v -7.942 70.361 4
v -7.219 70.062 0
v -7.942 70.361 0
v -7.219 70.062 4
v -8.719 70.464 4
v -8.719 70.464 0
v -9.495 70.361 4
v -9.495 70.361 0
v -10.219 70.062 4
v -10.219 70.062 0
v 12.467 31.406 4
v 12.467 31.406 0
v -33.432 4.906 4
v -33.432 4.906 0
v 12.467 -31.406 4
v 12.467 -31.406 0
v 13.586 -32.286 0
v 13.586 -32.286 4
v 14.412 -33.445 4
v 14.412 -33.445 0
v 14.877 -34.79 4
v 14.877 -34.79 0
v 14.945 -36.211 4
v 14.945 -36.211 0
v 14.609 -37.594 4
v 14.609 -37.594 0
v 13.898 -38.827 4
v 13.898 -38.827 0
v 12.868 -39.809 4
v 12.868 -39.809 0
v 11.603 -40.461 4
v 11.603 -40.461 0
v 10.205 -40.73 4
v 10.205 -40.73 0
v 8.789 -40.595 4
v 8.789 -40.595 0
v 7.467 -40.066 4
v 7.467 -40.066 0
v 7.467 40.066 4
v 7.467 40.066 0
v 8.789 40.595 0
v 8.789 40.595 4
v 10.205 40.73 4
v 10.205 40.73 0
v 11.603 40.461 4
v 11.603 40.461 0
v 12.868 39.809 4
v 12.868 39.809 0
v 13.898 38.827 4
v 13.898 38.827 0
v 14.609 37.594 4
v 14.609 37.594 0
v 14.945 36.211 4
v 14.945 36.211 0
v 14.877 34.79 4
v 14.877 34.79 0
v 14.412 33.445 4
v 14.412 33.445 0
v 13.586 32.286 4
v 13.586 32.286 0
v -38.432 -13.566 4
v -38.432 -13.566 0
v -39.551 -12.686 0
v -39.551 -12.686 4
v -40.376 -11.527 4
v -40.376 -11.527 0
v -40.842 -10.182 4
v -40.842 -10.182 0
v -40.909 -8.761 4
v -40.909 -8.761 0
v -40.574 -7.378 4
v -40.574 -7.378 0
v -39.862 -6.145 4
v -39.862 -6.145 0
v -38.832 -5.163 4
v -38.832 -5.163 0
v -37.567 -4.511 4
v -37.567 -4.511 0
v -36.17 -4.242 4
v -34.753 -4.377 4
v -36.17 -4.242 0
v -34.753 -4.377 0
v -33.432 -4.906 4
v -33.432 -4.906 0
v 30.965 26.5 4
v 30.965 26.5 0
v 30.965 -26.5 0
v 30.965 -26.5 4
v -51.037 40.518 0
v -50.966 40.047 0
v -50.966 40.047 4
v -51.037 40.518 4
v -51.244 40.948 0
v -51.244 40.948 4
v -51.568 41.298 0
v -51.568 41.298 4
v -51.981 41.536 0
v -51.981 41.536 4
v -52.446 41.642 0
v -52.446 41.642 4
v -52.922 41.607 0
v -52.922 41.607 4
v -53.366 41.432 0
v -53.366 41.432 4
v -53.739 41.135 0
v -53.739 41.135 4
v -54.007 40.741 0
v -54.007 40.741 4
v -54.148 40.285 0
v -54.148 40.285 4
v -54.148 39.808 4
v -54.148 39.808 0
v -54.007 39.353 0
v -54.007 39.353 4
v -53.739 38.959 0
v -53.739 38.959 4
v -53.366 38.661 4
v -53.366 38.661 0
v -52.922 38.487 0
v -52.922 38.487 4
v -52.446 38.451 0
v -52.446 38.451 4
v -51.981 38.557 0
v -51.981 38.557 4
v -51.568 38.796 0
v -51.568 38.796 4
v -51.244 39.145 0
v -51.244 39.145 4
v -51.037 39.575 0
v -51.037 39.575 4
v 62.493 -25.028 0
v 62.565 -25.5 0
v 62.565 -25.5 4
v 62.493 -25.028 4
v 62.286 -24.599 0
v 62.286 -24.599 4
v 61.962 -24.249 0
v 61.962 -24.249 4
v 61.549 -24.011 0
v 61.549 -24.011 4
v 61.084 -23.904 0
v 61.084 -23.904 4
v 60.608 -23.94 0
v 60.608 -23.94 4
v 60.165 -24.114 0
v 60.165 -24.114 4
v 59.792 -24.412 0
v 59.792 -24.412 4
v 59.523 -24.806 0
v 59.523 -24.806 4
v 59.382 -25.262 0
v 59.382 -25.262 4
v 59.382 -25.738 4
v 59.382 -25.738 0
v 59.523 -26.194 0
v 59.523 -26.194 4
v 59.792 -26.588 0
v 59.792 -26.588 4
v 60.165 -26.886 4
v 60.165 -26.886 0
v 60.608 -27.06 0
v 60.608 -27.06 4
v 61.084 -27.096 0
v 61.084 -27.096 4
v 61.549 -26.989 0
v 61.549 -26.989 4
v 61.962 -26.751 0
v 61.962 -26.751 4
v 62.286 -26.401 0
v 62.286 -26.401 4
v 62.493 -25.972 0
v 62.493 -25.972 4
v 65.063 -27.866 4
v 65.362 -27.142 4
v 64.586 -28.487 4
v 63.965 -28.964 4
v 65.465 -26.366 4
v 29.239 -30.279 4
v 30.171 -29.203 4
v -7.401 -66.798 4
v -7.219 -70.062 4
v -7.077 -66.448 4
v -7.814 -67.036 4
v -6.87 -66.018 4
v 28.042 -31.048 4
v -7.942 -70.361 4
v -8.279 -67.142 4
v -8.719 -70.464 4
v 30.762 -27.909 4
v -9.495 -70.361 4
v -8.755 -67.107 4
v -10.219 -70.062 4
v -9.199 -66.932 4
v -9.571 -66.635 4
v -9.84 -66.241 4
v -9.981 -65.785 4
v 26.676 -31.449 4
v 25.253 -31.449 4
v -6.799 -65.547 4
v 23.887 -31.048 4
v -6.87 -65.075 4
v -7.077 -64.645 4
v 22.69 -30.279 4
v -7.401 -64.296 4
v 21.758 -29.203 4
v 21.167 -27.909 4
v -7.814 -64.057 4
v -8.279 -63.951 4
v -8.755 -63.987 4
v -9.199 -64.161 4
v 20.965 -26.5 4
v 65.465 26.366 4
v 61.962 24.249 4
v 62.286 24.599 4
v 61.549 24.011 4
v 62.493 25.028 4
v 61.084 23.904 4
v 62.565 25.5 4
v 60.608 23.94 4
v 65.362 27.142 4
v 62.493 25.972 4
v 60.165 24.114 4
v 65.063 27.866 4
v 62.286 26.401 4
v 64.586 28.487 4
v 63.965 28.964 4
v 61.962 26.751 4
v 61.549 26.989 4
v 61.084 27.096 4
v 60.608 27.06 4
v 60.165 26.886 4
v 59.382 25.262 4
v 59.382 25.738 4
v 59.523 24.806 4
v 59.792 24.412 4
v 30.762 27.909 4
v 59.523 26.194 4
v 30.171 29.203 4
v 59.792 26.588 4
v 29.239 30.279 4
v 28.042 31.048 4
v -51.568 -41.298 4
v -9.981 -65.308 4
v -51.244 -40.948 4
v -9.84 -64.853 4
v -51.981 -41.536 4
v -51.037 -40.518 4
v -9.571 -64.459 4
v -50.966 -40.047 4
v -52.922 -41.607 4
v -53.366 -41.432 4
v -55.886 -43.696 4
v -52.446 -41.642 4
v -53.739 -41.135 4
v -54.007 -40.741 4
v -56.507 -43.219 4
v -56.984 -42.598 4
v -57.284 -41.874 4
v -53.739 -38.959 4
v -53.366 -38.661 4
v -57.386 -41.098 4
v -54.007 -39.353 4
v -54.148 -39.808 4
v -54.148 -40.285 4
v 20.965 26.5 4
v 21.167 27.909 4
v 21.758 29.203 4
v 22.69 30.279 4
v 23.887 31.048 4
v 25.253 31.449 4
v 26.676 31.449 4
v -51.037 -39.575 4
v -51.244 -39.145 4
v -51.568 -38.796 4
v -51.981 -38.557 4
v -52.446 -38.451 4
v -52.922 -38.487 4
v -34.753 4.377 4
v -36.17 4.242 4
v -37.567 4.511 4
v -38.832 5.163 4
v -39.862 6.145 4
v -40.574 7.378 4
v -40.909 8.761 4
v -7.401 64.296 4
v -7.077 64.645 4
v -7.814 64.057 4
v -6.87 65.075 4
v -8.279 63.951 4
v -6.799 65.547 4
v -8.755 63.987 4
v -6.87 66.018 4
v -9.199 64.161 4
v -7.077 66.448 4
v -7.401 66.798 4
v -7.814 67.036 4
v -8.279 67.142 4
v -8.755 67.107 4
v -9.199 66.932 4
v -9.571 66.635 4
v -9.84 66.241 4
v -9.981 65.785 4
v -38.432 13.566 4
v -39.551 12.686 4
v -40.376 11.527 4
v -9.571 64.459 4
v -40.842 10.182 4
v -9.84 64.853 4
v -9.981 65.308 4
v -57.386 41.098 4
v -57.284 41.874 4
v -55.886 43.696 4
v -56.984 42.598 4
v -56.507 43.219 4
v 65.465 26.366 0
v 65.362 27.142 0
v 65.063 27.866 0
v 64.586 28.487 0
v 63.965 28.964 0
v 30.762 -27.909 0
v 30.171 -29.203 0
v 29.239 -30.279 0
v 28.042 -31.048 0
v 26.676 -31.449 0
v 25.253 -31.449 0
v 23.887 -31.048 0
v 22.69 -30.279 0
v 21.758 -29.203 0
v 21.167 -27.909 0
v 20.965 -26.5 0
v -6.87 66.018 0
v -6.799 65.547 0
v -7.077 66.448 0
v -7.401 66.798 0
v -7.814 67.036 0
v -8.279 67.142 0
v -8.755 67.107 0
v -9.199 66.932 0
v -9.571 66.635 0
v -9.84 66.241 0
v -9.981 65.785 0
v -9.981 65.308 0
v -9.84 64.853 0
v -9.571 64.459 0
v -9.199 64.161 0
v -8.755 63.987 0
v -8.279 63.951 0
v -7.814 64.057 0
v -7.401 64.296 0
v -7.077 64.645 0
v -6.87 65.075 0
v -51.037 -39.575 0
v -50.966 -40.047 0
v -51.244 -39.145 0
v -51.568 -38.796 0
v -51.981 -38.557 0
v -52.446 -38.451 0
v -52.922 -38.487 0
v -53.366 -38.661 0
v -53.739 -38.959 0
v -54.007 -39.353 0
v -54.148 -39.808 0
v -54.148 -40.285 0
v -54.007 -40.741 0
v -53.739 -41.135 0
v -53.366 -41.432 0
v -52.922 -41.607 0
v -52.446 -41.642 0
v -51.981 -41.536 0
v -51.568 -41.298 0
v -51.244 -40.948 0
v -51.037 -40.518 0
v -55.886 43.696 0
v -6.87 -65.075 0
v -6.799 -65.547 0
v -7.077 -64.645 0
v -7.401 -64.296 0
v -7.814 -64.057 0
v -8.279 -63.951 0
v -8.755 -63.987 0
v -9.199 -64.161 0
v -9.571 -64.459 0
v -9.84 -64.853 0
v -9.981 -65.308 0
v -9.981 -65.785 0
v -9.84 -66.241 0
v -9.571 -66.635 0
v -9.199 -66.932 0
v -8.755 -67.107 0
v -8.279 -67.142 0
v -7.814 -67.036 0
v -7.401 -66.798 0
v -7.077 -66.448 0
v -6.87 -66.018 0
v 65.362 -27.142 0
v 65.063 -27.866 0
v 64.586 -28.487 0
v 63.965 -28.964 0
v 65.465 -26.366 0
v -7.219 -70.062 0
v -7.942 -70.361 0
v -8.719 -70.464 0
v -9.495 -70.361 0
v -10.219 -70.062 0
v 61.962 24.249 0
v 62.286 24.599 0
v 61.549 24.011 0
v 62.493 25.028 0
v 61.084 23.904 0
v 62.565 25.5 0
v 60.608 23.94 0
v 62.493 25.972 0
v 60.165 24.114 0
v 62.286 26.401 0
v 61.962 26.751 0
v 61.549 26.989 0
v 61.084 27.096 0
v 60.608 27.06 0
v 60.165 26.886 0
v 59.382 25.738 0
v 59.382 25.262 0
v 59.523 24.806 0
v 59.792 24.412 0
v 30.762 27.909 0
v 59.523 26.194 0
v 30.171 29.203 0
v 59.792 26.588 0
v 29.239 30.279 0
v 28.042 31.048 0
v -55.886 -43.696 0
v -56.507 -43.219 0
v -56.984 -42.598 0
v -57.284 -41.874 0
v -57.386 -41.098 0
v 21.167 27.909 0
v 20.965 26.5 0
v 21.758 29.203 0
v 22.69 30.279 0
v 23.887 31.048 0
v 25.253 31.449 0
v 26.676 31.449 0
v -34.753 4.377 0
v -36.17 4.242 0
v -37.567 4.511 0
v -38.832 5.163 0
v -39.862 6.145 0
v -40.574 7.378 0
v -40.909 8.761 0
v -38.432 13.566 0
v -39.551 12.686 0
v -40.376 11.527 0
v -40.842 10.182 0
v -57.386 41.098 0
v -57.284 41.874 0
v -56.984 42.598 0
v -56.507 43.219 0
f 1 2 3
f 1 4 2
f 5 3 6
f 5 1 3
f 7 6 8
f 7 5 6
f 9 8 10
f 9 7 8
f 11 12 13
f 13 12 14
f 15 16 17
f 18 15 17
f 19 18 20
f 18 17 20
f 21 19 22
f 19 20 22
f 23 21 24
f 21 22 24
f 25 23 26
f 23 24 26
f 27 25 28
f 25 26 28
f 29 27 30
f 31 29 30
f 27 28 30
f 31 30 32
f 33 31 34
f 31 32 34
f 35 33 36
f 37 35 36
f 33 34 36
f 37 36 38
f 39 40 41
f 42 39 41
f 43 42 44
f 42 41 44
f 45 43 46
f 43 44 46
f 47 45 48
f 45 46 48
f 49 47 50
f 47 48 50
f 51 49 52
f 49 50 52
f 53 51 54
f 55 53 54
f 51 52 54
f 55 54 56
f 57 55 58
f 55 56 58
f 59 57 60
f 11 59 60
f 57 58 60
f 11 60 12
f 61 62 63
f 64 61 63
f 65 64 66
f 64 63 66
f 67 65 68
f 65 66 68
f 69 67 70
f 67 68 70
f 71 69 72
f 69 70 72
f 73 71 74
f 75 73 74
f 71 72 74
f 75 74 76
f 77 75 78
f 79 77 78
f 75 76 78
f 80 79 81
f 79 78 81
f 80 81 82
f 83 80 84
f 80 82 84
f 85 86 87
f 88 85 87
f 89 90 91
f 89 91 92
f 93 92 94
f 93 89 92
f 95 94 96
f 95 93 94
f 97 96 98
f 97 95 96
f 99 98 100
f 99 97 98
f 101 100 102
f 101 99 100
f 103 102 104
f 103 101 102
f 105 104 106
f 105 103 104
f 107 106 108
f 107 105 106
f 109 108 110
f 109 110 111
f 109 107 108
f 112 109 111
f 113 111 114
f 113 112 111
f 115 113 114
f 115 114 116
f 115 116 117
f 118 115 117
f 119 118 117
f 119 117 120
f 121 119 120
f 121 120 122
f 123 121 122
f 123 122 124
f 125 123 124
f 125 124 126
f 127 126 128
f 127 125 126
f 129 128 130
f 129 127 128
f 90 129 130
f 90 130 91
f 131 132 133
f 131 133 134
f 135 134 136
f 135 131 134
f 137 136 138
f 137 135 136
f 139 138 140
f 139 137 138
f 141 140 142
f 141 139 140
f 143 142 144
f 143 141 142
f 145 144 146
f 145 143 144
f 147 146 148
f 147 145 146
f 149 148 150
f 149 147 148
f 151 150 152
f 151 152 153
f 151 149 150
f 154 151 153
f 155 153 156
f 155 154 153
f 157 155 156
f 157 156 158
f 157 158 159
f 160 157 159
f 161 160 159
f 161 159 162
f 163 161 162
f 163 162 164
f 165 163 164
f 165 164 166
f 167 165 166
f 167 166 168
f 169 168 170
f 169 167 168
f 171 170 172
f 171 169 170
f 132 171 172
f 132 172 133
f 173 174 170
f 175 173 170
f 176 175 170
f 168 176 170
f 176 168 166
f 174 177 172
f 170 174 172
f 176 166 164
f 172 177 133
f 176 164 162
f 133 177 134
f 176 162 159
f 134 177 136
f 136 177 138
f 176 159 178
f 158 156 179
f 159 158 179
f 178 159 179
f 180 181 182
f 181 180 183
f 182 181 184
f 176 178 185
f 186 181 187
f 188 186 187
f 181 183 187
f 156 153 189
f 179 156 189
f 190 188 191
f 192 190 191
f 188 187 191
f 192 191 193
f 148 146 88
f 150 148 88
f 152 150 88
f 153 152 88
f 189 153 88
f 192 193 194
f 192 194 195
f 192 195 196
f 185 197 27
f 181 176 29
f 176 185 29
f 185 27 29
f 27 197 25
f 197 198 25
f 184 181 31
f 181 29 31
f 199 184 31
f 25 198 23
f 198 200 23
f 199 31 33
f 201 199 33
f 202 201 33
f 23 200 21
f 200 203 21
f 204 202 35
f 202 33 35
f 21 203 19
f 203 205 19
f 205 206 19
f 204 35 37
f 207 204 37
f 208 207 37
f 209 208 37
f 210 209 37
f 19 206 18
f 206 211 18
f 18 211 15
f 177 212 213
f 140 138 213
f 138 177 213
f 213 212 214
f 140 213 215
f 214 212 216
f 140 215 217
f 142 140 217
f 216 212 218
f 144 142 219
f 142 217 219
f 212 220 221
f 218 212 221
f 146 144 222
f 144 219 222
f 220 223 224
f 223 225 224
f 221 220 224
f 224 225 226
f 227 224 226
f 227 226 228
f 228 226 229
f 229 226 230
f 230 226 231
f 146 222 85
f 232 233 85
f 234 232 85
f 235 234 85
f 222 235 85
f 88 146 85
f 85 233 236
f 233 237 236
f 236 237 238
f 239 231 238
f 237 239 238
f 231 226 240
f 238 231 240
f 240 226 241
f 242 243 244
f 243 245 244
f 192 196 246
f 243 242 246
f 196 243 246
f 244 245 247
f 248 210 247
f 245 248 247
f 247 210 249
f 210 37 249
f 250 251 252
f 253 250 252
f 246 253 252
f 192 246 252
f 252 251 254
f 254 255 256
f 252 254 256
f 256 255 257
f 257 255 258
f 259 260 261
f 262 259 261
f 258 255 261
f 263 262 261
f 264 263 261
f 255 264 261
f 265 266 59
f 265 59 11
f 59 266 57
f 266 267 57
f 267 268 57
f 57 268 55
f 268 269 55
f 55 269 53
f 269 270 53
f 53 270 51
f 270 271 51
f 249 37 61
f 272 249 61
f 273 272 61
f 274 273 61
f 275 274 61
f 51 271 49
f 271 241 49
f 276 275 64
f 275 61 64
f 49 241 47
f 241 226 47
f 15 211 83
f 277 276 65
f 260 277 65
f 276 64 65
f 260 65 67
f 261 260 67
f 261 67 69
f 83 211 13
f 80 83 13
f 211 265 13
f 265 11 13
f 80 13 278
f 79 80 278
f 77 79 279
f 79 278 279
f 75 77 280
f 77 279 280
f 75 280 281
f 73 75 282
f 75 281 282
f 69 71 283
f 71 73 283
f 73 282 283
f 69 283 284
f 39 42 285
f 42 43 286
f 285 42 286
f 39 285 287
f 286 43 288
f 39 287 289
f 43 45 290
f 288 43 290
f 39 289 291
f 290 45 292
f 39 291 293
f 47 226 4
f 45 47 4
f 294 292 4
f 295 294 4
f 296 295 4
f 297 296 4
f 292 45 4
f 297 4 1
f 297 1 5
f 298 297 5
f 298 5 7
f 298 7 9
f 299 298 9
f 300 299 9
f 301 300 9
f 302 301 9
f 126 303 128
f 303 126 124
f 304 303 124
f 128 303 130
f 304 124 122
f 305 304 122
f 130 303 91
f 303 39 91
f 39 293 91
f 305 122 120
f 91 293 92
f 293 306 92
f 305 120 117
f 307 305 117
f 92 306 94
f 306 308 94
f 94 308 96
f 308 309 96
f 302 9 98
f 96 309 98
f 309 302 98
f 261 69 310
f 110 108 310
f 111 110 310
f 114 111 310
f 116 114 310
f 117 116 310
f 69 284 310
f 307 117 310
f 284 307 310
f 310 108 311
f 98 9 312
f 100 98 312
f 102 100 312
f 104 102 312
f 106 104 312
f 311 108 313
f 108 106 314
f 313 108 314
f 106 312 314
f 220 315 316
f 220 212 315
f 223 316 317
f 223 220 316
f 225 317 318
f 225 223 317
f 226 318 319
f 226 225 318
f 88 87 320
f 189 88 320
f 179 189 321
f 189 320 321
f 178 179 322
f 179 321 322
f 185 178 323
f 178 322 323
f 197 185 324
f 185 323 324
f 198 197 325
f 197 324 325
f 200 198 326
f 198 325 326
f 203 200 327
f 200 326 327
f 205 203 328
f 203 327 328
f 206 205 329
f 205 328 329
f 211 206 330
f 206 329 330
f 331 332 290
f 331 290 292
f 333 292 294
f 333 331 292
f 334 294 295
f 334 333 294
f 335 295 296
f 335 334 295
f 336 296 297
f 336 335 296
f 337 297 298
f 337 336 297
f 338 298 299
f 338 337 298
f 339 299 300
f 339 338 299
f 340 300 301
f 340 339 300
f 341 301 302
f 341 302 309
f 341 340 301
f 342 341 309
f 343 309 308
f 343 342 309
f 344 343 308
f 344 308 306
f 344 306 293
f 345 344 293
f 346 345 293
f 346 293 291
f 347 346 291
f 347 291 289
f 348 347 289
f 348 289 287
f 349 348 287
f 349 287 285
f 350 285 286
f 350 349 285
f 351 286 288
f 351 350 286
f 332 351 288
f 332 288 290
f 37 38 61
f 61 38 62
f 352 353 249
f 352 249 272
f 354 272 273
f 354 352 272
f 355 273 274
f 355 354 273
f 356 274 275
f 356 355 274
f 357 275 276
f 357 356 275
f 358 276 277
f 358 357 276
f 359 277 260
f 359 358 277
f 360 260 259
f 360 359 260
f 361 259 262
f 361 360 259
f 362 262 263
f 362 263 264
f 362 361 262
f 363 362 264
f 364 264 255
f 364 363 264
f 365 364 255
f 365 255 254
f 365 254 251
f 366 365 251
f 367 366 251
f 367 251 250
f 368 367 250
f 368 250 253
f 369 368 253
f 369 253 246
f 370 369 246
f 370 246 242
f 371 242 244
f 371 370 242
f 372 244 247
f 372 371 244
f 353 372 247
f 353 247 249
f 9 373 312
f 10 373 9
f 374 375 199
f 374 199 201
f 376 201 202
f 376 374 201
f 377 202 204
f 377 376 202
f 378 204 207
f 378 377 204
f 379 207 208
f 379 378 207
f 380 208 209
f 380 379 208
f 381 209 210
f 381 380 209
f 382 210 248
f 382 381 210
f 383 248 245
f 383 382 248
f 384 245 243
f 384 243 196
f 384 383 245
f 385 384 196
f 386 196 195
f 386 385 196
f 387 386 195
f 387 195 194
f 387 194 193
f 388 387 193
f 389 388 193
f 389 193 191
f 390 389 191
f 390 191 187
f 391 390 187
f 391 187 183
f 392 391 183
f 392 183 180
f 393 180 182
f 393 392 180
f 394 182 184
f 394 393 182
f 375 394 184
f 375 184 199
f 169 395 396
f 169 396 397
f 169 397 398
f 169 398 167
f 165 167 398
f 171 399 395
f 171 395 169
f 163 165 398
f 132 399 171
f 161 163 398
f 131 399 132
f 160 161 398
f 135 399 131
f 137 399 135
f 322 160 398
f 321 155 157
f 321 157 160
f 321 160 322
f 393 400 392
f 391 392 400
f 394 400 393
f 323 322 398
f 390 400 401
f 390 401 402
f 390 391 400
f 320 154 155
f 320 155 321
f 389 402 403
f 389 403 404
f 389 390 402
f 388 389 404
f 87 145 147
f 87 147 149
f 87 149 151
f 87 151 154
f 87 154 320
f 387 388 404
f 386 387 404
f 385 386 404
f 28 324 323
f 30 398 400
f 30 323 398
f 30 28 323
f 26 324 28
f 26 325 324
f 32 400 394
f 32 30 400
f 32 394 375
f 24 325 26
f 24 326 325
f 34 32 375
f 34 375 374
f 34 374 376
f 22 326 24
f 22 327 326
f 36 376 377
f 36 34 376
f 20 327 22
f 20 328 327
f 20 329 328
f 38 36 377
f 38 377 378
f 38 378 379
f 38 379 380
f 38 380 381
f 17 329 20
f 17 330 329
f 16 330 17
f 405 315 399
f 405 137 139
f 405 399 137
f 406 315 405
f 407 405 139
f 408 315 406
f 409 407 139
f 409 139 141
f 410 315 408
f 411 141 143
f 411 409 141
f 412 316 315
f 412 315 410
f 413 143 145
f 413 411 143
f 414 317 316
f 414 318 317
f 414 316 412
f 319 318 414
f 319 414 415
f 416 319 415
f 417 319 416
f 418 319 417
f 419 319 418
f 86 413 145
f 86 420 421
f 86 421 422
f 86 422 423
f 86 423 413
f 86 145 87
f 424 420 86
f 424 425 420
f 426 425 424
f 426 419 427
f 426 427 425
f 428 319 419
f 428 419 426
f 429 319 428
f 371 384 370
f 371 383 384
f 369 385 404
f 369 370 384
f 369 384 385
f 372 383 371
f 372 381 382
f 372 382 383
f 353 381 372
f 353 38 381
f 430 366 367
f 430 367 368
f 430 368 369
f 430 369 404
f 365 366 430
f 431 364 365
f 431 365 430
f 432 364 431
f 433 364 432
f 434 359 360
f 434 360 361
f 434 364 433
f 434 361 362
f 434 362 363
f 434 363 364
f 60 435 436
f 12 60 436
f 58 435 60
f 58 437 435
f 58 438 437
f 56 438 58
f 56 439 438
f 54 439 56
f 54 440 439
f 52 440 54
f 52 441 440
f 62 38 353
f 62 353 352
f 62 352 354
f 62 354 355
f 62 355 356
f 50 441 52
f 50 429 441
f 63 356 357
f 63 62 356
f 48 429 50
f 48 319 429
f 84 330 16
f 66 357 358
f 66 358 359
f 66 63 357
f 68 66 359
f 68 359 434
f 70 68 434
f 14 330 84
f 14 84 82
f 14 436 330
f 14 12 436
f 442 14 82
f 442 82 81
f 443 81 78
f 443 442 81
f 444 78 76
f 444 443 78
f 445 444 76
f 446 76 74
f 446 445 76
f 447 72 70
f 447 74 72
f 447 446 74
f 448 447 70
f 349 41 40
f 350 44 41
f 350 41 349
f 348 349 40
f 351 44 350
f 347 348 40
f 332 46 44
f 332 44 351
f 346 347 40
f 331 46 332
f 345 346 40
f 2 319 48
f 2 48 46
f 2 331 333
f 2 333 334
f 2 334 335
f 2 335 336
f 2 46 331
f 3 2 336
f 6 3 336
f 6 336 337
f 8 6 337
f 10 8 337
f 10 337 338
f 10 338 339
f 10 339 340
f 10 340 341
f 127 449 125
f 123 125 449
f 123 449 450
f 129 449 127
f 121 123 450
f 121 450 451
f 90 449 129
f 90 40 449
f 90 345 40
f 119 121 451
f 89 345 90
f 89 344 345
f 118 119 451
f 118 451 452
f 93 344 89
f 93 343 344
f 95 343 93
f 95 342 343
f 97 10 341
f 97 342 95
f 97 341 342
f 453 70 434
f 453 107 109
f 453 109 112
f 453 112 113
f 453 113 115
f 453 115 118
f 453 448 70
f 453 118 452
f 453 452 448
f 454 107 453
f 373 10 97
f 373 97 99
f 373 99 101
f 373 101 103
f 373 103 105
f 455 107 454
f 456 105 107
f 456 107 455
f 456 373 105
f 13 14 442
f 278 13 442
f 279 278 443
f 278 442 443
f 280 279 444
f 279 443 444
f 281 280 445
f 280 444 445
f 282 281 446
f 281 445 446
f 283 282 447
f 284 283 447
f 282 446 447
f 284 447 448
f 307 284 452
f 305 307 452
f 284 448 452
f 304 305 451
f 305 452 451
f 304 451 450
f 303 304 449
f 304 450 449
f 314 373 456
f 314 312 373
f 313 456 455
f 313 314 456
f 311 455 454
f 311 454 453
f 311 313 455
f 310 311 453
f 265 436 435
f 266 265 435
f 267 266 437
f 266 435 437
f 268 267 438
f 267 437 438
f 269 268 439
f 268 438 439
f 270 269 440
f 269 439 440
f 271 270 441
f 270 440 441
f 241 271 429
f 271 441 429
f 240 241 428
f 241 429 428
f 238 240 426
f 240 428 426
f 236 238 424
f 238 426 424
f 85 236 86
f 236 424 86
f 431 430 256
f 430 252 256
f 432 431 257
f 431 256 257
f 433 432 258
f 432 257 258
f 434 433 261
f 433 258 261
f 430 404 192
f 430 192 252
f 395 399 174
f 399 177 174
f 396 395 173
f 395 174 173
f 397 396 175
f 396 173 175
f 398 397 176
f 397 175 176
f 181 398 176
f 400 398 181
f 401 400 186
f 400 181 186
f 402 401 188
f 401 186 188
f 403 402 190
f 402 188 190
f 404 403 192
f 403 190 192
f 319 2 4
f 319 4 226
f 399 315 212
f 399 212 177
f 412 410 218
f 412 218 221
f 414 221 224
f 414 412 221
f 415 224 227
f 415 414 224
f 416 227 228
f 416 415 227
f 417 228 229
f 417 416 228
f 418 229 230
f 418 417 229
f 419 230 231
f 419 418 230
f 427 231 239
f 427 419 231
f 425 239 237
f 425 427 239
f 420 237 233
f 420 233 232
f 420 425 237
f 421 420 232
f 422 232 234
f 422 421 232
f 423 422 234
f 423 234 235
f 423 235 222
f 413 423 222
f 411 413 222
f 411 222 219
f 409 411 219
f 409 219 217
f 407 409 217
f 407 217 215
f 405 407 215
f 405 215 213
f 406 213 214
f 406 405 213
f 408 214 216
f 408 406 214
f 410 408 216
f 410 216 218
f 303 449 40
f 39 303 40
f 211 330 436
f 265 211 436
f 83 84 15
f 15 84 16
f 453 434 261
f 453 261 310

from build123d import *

# Parameters (mm, degrees)
SKETCH_1_R      = 1.6
EXTRUDE_1_DEPTH = 4
FILLET_1_R      = 3


with BuildPart() as part:
    # 草图1 → 凸台-拉伸1 (new body)
    with BuildSketch(Plane.XY):
        Polygon((65.464500341, 28.098076211), (65.464500341, -28.098076211), (-8.718623412, -70.927722679), (-57.385919005, -42.829646468), (-57.385919005, 42.829646468), (-8.718623412, 70.927722679), align=None)
        with Locations((60.964500341, 25.5)):
            Circle(SKETCH_1_R, mode=Mode.SUBTRACT)
        with Locations((60.964500341, -25.5)):
            Circle(SKETCH_1_R, mode=Mode.SUBTRACT)
        with Locations((-8.398602374, -65.546806024)):
            Circle(SKETCH_1_R, mode=Mode.SUBTRACT)
        with Locations((-52.565897967, -40.046806024)):
            Circle(SKETCH_1_R, mode=Mode.SUBTRACT)
        with Locations((-52.565897967, 40.046806024)):
            Circle(SKETCH_1_R, mode=Mode.SUBTRACT)
        with Locations((-8.398602374, 65.546806024)):
            Circle(SKETCH_1_R, mode=Mode.SUBTRACT)
        with BuildLine():
            Line((30.964500341, 26.5), (30.964500341, -26.5))
            ThreePointArc((30.964500341, -26.5), (25.964500341, -31.5), (20.964500341, -26.5))
            Line((20.964500341, -26.5), (20.964500341, 26.5))
            ThreePointArc((20.964500341, 26.5), (25.964500341, 31.5), (30.964500341, 26.5))
        make_face(mode=Mode.SUBTRACT)
        with BuildLine():
            Line((7.46742303, -40.06604391), (-38.431923371, -13.56604391))
            ThreePointArc((-38.431923371, -13.56604391), (-40.26205039, -6.735916892), (-33.431923371, -4.905789873))
            Line((-33.431923371, -4.905789873), (12.46742303, -31.405789873))
            ThreePointArc((12.46742303, -31.405789873), (14.297550049, -38.235916892), (7.46742303, -40.06604391))
        make_face(mode=Mode.SUBTRACT)
        with BuildLine():
            Line((-38.431923371, 13.56604391), (7.46742303, 40.06604391))
            ThreePointArc((7.46742303, 40.06604391), (14.297550049, 38.235916892), (12.46742303, 31.405789873))
            Line((12.46742303, 31.405789873), (-33.431923371, 4.905789873))
            ThreePointArc((-33.431923371, 4.905789873), (-40.26205039, 6.735916892), (-38.431923371, 13.56604391))
        make_face(mode=Mode.SUBTRACT)
    extrude(amount=EXTRUDE_1_DEPTH)

    # 圆角1
    fillet_1_edges = [part.edges().sort_by_distance(p)[0] for p in [
        (-57.385919005, 42.829646468, 2),
        (-8.718623412, 70.927722679, 2),
        (65.464500341, 28.098076211, 2),
        (65.464500341, -28.098076211, 2),
        (-8.718623412, -70.927722679, 2),
        (-57.385919005, -42.829646468, 2),
    ]]
    fillet(fillet_1_edges, radius=FILLET_1_R)


solid = part.part
